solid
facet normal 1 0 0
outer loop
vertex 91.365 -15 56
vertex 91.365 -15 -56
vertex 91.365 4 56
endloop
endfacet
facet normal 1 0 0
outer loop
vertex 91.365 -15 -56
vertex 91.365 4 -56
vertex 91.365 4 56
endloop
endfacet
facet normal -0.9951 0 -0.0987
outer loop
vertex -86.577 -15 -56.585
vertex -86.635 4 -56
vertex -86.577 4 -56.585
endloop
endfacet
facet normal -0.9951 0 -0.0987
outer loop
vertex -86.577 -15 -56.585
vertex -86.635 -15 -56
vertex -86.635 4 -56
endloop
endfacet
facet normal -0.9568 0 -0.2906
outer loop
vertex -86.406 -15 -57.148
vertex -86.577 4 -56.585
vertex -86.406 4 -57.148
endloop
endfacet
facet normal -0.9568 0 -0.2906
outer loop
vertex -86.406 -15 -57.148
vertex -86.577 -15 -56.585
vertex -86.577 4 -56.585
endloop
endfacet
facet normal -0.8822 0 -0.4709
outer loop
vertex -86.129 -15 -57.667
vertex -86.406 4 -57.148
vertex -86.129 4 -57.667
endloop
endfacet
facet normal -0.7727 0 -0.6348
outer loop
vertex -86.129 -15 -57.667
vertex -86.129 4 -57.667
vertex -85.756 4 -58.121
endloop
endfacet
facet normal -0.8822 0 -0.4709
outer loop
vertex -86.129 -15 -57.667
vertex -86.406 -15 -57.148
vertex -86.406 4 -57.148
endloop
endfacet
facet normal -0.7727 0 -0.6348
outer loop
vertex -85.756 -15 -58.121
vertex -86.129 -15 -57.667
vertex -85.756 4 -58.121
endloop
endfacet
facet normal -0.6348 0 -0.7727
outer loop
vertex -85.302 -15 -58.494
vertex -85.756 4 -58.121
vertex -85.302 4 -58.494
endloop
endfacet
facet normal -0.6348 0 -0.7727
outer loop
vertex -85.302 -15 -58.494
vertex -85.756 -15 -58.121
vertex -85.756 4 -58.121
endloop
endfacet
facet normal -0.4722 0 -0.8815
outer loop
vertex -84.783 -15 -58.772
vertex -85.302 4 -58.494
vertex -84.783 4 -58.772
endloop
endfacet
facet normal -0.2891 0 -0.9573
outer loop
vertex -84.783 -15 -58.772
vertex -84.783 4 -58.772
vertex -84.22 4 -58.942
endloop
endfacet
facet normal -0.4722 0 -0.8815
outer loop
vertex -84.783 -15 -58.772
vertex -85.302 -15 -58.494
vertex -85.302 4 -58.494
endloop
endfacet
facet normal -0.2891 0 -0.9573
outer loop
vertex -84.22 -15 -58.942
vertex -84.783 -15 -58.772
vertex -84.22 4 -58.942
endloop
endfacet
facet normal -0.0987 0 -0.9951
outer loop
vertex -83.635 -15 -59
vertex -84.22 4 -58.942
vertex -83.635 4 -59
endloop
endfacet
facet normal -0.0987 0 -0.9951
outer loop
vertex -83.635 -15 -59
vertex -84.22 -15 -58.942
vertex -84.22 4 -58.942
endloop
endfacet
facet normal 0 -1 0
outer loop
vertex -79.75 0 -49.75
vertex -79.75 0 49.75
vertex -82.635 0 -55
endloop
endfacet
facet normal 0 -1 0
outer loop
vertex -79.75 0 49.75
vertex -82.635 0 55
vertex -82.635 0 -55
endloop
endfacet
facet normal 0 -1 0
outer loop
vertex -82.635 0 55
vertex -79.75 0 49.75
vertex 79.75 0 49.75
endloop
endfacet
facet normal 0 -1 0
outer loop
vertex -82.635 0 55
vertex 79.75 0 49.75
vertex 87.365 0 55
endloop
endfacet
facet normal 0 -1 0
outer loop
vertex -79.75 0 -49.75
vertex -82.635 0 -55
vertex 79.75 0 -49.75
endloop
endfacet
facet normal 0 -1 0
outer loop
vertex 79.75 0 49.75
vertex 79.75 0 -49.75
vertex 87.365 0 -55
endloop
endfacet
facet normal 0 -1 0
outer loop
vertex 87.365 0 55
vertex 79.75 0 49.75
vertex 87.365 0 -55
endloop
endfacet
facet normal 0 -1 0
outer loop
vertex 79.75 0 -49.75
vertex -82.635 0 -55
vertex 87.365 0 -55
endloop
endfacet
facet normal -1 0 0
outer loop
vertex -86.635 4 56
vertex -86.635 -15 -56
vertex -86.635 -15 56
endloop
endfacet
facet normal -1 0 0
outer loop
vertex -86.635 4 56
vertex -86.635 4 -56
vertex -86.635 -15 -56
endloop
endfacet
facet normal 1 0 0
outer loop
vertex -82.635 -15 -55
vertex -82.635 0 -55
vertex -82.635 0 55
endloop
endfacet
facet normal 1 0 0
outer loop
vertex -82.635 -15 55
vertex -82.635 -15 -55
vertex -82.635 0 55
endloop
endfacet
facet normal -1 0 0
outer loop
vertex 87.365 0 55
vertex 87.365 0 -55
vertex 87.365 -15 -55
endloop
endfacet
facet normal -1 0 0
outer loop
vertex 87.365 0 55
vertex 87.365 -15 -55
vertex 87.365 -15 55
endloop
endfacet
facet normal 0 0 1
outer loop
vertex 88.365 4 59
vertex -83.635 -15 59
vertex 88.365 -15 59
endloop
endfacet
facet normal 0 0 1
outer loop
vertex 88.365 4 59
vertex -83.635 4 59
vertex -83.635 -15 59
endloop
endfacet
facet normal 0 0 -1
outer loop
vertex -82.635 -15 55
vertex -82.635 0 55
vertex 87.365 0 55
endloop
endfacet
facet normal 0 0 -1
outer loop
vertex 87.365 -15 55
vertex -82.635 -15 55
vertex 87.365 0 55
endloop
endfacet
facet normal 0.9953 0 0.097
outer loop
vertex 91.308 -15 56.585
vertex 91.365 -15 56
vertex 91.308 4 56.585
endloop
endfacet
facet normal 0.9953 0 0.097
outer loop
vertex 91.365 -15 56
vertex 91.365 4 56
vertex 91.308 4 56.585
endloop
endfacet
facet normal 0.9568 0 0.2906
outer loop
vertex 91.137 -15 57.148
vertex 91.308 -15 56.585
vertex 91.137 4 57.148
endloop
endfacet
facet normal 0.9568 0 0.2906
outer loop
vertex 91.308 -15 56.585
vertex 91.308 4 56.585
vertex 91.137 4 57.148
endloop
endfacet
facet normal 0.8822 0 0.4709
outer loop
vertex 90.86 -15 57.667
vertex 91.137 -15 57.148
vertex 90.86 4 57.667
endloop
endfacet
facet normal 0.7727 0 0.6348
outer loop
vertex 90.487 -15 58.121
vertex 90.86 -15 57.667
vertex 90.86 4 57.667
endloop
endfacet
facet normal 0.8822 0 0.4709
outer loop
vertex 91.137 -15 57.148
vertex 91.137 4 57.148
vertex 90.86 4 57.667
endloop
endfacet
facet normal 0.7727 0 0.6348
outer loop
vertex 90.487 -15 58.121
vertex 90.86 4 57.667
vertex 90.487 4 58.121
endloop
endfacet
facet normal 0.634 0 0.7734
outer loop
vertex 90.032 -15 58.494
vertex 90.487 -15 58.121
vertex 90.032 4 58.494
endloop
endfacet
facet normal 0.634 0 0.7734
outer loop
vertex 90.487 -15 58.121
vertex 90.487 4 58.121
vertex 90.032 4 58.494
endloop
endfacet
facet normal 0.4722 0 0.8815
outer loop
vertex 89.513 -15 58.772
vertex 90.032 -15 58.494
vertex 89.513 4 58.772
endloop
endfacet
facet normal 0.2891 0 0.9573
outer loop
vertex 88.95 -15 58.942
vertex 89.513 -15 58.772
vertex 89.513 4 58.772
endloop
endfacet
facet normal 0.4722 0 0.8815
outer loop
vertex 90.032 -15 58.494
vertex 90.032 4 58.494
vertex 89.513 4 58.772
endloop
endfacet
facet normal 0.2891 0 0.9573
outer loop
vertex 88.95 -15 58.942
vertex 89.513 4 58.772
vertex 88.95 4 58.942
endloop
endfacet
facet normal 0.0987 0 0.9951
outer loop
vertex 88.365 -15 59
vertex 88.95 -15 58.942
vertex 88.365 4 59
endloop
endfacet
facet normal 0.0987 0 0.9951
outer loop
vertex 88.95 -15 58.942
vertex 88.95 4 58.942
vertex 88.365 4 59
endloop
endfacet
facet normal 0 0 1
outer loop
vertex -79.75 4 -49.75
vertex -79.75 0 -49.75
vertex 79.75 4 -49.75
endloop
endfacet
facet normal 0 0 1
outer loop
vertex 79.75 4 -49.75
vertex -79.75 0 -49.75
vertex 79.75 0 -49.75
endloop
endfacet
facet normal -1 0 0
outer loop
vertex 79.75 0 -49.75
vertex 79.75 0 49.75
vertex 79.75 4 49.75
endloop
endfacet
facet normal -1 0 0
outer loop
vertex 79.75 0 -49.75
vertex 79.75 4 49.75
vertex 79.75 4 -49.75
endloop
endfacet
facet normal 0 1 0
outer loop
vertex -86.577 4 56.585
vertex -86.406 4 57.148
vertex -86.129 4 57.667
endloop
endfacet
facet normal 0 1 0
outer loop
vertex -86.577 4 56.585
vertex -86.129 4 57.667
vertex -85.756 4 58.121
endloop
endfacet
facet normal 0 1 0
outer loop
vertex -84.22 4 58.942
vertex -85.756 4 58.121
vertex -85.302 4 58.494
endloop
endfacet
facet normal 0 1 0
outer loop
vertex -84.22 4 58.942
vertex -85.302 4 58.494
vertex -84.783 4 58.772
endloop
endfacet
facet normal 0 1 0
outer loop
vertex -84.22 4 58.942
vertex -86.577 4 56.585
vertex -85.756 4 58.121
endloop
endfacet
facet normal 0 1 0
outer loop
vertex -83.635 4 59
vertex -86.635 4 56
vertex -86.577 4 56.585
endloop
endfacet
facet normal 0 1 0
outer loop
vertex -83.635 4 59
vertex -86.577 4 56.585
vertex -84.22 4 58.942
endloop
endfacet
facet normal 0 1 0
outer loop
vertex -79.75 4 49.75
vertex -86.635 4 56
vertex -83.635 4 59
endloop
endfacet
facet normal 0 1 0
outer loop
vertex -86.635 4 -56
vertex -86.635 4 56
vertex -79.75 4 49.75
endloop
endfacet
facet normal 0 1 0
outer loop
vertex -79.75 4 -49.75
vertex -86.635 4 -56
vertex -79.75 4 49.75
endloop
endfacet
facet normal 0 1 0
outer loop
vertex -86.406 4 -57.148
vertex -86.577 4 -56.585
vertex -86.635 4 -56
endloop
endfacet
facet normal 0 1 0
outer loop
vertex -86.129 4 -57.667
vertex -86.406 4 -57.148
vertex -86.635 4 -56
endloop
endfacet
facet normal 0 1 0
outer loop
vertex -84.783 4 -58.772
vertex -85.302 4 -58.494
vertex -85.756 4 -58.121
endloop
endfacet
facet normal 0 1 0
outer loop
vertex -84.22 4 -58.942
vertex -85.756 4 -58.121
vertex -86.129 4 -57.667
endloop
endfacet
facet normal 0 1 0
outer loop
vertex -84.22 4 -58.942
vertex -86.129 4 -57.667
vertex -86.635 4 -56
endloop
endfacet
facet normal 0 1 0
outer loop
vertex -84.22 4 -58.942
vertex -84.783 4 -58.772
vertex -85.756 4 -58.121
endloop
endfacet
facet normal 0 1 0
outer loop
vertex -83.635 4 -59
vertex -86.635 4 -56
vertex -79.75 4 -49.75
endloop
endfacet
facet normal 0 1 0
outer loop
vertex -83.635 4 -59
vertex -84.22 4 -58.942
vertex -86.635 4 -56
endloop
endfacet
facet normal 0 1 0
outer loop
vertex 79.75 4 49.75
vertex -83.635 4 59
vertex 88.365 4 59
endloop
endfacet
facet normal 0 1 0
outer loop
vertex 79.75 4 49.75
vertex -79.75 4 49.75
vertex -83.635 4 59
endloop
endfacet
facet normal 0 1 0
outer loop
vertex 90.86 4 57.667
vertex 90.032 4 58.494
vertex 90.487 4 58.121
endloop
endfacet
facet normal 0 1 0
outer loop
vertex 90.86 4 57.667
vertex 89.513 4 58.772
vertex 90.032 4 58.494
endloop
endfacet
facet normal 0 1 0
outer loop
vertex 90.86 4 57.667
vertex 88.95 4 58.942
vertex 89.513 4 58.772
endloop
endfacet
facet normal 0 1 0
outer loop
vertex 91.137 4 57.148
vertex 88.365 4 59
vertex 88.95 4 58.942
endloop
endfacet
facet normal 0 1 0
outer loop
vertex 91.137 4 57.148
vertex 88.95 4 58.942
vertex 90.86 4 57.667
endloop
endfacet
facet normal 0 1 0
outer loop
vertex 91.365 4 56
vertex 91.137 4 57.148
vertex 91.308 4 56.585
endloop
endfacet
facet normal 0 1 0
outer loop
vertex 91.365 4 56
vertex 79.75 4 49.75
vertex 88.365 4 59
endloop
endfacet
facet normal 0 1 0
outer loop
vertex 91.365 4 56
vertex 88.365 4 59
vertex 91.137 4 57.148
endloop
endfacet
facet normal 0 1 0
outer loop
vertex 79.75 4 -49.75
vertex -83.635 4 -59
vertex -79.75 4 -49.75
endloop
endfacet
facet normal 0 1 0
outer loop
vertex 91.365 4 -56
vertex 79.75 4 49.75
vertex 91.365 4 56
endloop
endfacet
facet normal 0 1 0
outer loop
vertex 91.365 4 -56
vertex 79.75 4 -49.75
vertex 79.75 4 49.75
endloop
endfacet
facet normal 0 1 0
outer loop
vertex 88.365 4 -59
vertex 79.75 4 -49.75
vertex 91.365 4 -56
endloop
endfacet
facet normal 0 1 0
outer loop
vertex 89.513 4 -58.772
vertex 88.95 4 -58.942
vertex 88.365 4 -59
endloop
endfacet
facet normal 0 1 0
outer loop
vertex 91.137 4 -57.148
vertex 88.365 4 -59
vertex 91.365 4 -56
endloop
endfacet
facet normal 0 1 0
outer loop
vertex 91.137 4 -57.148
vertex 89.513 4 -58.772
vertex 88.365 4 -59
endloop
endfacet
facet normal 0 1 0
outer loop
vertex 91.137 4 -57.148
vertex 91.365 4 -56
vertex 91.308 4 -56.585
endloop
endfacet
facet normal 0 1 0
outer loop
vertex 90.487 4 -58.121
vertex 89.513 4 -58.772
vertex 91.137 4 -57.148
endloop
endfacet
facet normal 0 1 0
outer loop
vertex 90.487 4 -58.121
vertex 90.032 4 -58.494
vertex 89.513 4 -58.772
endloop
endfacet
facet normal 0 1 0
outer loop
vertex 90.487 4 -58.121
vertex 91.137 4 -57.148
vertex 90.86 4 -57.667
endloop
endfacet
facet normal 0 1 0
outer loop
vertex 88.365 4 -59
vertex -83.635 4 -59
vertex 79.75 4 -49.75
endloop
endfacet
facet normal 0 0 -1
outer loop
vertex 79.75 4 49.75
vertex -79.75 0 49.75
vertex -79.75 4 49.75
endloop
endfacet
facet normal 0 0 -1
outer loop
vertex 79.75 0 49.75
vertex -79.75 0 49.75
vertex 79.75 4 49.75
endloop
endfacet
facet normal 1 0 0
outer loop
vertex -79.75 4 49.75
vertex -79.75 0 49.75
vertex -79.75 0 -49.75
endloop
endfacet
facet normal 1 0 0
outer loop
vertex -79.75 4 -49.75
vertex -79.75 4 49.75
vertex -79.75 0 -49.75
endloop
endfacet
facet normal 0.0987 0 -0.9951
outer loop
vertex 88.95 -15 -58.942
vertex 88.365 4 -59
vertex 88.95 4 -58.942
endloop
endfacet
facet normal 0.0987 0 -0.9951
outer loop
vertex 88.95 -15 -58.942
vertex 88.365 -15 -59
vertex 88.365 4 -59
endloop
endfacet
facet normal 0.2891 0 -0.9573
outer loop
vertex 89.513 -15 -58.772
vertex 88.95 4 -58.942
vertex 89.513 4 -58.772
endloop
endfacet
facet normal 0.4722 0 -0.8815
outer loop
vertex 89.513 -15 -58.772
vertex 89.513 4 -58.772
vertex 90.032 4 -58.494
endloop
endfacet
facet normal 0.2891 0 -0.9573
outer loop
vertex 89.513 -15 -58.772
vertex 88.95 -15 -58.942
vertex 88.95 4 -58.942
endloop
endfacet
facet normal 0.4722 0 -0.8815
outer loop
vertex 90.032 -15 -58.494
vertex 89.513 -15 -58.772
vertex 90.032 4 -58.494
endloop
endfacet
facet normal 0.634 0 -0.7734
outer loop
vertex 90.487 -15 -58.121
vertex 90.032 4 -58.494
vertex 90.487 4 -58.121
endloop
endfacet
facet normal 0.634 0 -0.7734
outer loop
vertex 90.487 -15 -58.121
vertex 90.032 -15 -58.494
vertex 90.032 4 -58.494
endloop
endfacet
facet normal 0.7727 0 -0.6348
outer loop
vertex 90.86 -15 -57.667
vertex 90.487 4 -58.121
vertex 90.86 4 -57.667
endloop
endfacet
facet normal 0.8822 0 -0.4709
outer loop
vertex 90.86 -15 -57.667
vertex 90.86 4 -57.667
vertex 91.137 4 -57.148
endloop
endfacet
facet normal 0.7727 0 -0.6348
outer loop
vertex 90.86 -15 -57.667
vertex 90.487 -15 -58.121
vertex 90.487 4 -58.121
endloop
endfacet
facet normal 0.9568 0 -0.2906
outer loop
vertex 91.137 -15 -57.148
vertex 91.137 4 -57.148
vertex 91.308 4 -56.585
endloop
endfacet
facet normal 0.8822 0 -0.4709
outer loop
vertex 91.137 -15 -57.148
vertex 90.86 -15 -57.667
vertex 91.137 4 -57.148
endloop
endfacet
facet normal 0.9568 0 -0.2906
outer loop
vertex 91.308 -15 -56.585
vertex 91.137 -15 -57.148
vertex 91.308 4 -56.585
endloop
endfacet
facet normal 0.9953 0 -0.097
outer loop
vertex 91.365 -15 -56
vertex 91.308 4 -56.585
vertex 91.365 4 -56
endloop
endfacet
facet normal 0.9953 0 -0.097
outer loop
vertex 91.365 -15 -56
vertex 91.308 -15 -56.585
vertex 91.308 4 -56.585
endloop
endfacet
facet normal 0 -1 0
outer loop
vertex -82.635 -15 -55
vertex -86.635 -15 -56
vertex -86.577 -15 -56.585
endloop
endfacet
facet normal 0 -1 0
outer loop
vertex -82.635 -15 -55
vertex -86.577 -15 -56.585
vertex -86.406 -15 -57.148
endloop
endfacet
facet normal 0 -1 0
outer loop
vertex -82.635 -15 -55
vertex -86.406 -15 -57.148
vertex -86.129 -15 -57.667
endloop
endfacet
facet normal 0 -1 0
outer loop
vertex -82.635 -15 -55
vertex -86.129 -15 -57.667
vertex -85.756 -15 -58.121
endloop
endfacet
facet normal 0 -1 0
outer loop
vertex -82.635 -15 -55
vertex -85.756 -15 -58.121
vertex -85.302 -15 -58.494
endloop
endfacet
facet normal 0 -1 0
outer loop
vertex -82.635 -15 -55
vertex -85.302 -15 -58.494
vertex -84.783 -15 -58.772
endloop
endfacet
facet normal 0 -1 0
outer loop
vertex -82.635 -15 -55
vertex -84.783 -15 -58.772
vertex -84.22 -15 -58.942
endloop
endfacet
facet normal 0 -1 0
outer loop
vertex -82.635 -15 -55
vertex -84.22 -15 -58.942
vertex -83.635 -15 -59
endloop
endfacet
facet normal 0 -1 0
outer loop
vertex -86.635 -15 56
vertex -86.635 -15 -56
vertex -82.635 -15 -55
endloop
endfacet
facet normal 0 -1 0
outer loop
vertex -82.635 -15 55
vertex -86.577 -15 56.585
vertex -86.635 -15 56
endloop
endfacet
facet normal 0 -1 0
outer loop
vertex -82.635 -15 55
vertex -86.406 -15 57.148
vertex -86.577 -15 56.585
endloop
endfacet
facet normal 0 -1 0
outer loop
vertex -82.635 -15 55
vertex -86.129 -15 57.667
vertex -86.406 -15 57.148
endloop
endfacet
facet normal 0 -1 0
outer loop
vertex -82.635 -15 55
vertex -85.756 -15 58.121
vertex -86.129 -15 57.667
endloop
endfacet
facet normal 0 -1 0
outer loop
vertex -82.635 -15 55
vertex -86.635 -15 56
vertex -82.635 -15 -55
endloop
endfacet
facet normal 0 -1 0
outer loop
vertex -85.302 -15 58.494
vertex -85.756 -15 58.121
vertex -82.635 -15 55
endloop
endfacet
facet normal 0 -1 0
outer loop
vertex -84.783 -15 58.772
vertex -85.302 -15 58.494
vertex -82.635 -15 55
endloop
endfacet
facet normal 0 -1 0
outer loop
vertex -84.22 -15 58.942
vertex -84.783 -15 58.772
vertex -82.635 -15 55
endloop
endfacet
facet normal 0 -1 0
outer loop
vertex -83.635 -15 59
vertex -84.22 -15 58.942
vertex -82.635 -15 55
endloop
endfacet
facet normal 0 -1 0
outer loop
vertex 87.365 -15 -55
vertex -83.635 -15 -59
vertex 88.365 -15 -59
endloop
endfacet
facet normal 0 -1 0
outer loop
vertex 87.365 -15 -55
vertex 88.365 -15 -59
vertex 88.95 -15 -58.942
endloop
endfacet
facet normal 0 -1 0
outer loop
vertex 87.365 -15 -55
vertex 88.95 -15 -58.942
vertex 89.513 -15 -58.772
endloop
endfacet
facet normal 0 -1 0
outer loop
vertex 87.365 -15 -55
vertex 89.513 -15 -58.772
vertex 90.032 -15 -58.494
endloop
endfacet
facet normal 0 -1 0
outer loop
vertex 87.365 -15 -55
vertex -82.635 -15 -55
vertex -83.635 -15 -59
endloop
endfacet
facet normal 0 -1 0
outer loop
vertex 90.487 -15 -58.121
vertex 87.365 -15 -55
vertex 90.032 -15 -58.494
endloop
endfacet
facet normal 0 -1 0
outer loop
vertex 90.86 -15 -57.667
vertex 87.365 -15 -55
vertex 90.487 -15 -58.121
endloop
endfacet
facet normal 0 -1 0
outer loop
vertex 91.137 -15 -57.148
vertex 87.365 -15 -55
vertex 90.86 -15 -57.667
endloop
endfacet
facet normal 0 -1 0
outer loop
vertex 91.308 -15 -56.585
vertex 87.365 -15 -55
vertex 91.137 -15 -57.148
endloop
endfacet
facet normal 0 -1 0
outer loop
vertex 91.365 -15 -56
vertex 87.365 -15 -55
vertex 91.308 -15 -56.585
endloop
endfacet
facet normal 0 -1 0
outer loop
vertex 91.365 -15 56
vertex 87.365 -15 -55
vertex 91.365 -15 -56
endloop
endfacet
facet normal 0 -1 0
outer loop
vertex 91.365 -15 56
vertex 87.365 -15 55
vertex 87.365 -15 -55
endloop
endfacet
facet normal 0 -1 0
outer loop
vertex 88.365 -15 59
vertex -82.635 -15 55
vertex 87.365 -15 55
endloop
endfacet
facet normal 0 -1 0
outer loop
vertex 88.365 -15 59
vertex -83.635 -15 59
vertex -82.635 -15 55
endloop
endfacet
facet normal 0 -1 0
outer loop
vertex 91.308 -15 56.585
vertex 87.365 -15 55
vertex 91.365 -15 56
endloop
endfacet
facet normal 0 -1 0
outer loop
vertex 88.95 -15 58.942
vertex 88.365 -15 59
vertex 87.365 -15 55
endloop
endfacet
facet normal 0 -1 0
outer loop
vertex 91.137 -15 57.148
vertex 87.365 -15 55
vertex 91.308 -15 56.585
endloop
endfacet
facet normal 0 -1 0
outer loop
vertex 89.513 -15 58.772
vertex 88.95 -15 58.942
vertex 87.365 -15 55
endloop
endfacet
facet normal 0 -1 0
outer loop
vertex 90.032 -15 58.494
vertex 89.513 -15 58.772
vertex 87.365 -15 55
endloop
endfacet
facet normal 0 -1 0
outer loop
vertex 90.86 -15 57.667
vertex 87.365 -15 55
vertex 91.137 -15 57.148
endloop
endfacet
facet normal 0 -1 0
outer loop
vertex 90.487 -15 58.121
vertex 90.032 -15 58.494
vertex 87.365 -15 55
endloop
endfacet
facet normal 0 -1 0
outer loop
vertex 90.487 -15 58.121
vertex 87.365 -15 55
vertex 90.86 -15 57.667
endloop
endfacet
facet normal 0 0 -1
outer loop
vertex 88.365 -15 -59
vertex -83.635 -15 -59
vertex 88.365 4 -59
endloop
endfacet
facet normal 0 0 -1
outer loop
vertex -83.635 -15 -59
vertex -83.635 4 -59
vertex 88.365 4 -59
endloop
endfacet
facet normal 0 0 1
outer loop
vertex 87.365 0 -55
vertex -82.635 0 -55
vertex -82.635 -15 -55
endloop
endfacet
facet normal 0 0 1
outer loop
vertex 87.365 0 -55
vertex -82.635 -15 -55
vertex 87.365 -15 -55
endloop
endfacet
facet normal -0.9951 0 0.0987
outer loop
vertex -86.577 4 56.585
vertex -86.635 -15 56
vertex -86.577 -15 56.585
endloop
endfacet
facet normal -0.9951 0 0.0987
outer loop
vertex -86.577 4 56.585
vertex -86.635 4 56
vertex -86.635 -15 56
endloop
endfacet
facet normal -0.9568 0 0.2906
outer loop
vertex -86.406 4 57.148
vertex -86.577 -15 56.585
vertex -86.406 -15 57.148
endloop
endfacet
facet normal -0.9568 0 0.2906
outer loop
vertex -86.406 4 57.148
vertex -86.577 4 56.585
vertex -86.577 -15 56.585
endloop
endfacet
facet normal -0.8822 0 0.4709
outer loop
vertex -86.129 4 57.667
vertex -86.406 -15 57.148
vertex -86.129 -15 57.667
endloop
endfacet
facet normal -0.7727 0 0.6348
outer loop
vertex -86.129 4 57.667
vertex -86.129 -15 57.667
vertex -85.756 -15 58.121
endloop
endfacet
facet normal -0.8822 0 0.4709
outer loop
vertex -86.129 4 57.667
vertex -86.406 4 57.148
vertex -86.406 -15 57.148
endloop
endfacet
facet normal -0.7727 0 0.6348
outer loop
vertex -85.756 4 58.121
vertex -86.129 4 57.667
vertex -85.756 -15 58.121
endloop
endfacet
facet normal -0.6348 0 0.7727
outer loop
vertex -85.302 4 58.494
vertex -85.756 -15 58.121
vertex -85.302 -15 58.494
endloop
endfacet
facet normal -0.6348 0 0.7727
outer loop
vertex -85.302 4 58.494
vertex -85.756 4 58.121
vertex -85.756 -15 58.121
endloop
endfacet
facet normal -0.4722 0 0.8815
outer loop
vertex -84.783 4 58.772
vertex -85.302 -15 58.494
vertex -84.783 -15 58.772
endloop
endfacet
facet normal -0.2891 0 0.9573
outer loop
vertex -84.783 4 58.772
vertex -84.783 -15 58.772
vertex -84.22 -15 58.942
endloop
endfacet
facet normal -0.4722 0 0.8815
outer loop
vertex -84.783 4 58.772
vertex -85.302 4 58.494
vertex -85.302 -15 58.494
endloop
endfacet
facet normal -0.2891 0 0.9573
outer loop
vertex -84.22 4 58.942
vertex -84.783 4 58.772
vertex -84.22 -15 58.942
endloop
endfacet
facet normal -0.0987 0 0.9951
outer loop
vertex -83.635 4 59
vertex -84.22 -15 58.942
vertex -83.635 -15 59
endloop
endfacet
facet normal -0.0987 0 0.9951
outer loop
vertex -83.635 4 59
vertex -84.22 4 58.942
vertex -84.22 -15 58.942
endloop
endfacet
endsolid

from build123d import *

# Parameters (mm, degrees)
SKETCH1_W           = 178
SKETCH1_H           = 118
SKETCH1_W_2         = 159.5
SKETCH1_H_2         = 99.5
BOSS_EXTRUDE1_DEPTH = 4
SKETCH2_W           = 178
SKETCH2_H           = 118
SKETCH2_W_2         = 170
SKETCH2_H_2         = 110
BOSS_EXTRUDE2_DEPTH = 15
FILLET1_R           = 3


with BuildPart() as part:
    # Sketch1 → Boss-Extrude1 (new body)
    with BuildSketch(Plane(origin=(0, 0, 0), x_dir=(1, 0, 0), z_dir=(0, 1, 0))):
        with Locations((2.365202132, 0)):
            Rectangle(SKETCH1_W, SKETCH1_H)
        Rectangle(SKETCH1_W_2, SKETCH1_H_2, mode=Mode.SUBTRACT)
    extrude(amount=BOSS_EXTRUDE1_DEPTH)

    # Sketch2 → Boss-Extrude2 (add)
    with BuildSketch(Plane.XZ):
        with Locations((2.365202132, 0)):
            Rectangle(SKETCH2_W, SKETCH2_H)
        with Locations((2.365202132, 0)):
            Rectangle(SKETCH2_W_2, SKETCH2_H_2, mode=Mode.SUBTRACT)
    extrude(amount=BOSS_EXTRUDE2_DEPTH)

    # Fillet1
    fillet1_edges = [part.edges().sort_by_distance(p)[0] for p in [
        (-86.634797868, -5.5, -59),
        (91.365202132, -5.5, -59),
        (91.365202132, -5.5, 59),
        (-86.634797868, -5.5, 59),
    ]]
    fillet(fillet1_edges, radius=FILLET1_R)


solid = part.part
